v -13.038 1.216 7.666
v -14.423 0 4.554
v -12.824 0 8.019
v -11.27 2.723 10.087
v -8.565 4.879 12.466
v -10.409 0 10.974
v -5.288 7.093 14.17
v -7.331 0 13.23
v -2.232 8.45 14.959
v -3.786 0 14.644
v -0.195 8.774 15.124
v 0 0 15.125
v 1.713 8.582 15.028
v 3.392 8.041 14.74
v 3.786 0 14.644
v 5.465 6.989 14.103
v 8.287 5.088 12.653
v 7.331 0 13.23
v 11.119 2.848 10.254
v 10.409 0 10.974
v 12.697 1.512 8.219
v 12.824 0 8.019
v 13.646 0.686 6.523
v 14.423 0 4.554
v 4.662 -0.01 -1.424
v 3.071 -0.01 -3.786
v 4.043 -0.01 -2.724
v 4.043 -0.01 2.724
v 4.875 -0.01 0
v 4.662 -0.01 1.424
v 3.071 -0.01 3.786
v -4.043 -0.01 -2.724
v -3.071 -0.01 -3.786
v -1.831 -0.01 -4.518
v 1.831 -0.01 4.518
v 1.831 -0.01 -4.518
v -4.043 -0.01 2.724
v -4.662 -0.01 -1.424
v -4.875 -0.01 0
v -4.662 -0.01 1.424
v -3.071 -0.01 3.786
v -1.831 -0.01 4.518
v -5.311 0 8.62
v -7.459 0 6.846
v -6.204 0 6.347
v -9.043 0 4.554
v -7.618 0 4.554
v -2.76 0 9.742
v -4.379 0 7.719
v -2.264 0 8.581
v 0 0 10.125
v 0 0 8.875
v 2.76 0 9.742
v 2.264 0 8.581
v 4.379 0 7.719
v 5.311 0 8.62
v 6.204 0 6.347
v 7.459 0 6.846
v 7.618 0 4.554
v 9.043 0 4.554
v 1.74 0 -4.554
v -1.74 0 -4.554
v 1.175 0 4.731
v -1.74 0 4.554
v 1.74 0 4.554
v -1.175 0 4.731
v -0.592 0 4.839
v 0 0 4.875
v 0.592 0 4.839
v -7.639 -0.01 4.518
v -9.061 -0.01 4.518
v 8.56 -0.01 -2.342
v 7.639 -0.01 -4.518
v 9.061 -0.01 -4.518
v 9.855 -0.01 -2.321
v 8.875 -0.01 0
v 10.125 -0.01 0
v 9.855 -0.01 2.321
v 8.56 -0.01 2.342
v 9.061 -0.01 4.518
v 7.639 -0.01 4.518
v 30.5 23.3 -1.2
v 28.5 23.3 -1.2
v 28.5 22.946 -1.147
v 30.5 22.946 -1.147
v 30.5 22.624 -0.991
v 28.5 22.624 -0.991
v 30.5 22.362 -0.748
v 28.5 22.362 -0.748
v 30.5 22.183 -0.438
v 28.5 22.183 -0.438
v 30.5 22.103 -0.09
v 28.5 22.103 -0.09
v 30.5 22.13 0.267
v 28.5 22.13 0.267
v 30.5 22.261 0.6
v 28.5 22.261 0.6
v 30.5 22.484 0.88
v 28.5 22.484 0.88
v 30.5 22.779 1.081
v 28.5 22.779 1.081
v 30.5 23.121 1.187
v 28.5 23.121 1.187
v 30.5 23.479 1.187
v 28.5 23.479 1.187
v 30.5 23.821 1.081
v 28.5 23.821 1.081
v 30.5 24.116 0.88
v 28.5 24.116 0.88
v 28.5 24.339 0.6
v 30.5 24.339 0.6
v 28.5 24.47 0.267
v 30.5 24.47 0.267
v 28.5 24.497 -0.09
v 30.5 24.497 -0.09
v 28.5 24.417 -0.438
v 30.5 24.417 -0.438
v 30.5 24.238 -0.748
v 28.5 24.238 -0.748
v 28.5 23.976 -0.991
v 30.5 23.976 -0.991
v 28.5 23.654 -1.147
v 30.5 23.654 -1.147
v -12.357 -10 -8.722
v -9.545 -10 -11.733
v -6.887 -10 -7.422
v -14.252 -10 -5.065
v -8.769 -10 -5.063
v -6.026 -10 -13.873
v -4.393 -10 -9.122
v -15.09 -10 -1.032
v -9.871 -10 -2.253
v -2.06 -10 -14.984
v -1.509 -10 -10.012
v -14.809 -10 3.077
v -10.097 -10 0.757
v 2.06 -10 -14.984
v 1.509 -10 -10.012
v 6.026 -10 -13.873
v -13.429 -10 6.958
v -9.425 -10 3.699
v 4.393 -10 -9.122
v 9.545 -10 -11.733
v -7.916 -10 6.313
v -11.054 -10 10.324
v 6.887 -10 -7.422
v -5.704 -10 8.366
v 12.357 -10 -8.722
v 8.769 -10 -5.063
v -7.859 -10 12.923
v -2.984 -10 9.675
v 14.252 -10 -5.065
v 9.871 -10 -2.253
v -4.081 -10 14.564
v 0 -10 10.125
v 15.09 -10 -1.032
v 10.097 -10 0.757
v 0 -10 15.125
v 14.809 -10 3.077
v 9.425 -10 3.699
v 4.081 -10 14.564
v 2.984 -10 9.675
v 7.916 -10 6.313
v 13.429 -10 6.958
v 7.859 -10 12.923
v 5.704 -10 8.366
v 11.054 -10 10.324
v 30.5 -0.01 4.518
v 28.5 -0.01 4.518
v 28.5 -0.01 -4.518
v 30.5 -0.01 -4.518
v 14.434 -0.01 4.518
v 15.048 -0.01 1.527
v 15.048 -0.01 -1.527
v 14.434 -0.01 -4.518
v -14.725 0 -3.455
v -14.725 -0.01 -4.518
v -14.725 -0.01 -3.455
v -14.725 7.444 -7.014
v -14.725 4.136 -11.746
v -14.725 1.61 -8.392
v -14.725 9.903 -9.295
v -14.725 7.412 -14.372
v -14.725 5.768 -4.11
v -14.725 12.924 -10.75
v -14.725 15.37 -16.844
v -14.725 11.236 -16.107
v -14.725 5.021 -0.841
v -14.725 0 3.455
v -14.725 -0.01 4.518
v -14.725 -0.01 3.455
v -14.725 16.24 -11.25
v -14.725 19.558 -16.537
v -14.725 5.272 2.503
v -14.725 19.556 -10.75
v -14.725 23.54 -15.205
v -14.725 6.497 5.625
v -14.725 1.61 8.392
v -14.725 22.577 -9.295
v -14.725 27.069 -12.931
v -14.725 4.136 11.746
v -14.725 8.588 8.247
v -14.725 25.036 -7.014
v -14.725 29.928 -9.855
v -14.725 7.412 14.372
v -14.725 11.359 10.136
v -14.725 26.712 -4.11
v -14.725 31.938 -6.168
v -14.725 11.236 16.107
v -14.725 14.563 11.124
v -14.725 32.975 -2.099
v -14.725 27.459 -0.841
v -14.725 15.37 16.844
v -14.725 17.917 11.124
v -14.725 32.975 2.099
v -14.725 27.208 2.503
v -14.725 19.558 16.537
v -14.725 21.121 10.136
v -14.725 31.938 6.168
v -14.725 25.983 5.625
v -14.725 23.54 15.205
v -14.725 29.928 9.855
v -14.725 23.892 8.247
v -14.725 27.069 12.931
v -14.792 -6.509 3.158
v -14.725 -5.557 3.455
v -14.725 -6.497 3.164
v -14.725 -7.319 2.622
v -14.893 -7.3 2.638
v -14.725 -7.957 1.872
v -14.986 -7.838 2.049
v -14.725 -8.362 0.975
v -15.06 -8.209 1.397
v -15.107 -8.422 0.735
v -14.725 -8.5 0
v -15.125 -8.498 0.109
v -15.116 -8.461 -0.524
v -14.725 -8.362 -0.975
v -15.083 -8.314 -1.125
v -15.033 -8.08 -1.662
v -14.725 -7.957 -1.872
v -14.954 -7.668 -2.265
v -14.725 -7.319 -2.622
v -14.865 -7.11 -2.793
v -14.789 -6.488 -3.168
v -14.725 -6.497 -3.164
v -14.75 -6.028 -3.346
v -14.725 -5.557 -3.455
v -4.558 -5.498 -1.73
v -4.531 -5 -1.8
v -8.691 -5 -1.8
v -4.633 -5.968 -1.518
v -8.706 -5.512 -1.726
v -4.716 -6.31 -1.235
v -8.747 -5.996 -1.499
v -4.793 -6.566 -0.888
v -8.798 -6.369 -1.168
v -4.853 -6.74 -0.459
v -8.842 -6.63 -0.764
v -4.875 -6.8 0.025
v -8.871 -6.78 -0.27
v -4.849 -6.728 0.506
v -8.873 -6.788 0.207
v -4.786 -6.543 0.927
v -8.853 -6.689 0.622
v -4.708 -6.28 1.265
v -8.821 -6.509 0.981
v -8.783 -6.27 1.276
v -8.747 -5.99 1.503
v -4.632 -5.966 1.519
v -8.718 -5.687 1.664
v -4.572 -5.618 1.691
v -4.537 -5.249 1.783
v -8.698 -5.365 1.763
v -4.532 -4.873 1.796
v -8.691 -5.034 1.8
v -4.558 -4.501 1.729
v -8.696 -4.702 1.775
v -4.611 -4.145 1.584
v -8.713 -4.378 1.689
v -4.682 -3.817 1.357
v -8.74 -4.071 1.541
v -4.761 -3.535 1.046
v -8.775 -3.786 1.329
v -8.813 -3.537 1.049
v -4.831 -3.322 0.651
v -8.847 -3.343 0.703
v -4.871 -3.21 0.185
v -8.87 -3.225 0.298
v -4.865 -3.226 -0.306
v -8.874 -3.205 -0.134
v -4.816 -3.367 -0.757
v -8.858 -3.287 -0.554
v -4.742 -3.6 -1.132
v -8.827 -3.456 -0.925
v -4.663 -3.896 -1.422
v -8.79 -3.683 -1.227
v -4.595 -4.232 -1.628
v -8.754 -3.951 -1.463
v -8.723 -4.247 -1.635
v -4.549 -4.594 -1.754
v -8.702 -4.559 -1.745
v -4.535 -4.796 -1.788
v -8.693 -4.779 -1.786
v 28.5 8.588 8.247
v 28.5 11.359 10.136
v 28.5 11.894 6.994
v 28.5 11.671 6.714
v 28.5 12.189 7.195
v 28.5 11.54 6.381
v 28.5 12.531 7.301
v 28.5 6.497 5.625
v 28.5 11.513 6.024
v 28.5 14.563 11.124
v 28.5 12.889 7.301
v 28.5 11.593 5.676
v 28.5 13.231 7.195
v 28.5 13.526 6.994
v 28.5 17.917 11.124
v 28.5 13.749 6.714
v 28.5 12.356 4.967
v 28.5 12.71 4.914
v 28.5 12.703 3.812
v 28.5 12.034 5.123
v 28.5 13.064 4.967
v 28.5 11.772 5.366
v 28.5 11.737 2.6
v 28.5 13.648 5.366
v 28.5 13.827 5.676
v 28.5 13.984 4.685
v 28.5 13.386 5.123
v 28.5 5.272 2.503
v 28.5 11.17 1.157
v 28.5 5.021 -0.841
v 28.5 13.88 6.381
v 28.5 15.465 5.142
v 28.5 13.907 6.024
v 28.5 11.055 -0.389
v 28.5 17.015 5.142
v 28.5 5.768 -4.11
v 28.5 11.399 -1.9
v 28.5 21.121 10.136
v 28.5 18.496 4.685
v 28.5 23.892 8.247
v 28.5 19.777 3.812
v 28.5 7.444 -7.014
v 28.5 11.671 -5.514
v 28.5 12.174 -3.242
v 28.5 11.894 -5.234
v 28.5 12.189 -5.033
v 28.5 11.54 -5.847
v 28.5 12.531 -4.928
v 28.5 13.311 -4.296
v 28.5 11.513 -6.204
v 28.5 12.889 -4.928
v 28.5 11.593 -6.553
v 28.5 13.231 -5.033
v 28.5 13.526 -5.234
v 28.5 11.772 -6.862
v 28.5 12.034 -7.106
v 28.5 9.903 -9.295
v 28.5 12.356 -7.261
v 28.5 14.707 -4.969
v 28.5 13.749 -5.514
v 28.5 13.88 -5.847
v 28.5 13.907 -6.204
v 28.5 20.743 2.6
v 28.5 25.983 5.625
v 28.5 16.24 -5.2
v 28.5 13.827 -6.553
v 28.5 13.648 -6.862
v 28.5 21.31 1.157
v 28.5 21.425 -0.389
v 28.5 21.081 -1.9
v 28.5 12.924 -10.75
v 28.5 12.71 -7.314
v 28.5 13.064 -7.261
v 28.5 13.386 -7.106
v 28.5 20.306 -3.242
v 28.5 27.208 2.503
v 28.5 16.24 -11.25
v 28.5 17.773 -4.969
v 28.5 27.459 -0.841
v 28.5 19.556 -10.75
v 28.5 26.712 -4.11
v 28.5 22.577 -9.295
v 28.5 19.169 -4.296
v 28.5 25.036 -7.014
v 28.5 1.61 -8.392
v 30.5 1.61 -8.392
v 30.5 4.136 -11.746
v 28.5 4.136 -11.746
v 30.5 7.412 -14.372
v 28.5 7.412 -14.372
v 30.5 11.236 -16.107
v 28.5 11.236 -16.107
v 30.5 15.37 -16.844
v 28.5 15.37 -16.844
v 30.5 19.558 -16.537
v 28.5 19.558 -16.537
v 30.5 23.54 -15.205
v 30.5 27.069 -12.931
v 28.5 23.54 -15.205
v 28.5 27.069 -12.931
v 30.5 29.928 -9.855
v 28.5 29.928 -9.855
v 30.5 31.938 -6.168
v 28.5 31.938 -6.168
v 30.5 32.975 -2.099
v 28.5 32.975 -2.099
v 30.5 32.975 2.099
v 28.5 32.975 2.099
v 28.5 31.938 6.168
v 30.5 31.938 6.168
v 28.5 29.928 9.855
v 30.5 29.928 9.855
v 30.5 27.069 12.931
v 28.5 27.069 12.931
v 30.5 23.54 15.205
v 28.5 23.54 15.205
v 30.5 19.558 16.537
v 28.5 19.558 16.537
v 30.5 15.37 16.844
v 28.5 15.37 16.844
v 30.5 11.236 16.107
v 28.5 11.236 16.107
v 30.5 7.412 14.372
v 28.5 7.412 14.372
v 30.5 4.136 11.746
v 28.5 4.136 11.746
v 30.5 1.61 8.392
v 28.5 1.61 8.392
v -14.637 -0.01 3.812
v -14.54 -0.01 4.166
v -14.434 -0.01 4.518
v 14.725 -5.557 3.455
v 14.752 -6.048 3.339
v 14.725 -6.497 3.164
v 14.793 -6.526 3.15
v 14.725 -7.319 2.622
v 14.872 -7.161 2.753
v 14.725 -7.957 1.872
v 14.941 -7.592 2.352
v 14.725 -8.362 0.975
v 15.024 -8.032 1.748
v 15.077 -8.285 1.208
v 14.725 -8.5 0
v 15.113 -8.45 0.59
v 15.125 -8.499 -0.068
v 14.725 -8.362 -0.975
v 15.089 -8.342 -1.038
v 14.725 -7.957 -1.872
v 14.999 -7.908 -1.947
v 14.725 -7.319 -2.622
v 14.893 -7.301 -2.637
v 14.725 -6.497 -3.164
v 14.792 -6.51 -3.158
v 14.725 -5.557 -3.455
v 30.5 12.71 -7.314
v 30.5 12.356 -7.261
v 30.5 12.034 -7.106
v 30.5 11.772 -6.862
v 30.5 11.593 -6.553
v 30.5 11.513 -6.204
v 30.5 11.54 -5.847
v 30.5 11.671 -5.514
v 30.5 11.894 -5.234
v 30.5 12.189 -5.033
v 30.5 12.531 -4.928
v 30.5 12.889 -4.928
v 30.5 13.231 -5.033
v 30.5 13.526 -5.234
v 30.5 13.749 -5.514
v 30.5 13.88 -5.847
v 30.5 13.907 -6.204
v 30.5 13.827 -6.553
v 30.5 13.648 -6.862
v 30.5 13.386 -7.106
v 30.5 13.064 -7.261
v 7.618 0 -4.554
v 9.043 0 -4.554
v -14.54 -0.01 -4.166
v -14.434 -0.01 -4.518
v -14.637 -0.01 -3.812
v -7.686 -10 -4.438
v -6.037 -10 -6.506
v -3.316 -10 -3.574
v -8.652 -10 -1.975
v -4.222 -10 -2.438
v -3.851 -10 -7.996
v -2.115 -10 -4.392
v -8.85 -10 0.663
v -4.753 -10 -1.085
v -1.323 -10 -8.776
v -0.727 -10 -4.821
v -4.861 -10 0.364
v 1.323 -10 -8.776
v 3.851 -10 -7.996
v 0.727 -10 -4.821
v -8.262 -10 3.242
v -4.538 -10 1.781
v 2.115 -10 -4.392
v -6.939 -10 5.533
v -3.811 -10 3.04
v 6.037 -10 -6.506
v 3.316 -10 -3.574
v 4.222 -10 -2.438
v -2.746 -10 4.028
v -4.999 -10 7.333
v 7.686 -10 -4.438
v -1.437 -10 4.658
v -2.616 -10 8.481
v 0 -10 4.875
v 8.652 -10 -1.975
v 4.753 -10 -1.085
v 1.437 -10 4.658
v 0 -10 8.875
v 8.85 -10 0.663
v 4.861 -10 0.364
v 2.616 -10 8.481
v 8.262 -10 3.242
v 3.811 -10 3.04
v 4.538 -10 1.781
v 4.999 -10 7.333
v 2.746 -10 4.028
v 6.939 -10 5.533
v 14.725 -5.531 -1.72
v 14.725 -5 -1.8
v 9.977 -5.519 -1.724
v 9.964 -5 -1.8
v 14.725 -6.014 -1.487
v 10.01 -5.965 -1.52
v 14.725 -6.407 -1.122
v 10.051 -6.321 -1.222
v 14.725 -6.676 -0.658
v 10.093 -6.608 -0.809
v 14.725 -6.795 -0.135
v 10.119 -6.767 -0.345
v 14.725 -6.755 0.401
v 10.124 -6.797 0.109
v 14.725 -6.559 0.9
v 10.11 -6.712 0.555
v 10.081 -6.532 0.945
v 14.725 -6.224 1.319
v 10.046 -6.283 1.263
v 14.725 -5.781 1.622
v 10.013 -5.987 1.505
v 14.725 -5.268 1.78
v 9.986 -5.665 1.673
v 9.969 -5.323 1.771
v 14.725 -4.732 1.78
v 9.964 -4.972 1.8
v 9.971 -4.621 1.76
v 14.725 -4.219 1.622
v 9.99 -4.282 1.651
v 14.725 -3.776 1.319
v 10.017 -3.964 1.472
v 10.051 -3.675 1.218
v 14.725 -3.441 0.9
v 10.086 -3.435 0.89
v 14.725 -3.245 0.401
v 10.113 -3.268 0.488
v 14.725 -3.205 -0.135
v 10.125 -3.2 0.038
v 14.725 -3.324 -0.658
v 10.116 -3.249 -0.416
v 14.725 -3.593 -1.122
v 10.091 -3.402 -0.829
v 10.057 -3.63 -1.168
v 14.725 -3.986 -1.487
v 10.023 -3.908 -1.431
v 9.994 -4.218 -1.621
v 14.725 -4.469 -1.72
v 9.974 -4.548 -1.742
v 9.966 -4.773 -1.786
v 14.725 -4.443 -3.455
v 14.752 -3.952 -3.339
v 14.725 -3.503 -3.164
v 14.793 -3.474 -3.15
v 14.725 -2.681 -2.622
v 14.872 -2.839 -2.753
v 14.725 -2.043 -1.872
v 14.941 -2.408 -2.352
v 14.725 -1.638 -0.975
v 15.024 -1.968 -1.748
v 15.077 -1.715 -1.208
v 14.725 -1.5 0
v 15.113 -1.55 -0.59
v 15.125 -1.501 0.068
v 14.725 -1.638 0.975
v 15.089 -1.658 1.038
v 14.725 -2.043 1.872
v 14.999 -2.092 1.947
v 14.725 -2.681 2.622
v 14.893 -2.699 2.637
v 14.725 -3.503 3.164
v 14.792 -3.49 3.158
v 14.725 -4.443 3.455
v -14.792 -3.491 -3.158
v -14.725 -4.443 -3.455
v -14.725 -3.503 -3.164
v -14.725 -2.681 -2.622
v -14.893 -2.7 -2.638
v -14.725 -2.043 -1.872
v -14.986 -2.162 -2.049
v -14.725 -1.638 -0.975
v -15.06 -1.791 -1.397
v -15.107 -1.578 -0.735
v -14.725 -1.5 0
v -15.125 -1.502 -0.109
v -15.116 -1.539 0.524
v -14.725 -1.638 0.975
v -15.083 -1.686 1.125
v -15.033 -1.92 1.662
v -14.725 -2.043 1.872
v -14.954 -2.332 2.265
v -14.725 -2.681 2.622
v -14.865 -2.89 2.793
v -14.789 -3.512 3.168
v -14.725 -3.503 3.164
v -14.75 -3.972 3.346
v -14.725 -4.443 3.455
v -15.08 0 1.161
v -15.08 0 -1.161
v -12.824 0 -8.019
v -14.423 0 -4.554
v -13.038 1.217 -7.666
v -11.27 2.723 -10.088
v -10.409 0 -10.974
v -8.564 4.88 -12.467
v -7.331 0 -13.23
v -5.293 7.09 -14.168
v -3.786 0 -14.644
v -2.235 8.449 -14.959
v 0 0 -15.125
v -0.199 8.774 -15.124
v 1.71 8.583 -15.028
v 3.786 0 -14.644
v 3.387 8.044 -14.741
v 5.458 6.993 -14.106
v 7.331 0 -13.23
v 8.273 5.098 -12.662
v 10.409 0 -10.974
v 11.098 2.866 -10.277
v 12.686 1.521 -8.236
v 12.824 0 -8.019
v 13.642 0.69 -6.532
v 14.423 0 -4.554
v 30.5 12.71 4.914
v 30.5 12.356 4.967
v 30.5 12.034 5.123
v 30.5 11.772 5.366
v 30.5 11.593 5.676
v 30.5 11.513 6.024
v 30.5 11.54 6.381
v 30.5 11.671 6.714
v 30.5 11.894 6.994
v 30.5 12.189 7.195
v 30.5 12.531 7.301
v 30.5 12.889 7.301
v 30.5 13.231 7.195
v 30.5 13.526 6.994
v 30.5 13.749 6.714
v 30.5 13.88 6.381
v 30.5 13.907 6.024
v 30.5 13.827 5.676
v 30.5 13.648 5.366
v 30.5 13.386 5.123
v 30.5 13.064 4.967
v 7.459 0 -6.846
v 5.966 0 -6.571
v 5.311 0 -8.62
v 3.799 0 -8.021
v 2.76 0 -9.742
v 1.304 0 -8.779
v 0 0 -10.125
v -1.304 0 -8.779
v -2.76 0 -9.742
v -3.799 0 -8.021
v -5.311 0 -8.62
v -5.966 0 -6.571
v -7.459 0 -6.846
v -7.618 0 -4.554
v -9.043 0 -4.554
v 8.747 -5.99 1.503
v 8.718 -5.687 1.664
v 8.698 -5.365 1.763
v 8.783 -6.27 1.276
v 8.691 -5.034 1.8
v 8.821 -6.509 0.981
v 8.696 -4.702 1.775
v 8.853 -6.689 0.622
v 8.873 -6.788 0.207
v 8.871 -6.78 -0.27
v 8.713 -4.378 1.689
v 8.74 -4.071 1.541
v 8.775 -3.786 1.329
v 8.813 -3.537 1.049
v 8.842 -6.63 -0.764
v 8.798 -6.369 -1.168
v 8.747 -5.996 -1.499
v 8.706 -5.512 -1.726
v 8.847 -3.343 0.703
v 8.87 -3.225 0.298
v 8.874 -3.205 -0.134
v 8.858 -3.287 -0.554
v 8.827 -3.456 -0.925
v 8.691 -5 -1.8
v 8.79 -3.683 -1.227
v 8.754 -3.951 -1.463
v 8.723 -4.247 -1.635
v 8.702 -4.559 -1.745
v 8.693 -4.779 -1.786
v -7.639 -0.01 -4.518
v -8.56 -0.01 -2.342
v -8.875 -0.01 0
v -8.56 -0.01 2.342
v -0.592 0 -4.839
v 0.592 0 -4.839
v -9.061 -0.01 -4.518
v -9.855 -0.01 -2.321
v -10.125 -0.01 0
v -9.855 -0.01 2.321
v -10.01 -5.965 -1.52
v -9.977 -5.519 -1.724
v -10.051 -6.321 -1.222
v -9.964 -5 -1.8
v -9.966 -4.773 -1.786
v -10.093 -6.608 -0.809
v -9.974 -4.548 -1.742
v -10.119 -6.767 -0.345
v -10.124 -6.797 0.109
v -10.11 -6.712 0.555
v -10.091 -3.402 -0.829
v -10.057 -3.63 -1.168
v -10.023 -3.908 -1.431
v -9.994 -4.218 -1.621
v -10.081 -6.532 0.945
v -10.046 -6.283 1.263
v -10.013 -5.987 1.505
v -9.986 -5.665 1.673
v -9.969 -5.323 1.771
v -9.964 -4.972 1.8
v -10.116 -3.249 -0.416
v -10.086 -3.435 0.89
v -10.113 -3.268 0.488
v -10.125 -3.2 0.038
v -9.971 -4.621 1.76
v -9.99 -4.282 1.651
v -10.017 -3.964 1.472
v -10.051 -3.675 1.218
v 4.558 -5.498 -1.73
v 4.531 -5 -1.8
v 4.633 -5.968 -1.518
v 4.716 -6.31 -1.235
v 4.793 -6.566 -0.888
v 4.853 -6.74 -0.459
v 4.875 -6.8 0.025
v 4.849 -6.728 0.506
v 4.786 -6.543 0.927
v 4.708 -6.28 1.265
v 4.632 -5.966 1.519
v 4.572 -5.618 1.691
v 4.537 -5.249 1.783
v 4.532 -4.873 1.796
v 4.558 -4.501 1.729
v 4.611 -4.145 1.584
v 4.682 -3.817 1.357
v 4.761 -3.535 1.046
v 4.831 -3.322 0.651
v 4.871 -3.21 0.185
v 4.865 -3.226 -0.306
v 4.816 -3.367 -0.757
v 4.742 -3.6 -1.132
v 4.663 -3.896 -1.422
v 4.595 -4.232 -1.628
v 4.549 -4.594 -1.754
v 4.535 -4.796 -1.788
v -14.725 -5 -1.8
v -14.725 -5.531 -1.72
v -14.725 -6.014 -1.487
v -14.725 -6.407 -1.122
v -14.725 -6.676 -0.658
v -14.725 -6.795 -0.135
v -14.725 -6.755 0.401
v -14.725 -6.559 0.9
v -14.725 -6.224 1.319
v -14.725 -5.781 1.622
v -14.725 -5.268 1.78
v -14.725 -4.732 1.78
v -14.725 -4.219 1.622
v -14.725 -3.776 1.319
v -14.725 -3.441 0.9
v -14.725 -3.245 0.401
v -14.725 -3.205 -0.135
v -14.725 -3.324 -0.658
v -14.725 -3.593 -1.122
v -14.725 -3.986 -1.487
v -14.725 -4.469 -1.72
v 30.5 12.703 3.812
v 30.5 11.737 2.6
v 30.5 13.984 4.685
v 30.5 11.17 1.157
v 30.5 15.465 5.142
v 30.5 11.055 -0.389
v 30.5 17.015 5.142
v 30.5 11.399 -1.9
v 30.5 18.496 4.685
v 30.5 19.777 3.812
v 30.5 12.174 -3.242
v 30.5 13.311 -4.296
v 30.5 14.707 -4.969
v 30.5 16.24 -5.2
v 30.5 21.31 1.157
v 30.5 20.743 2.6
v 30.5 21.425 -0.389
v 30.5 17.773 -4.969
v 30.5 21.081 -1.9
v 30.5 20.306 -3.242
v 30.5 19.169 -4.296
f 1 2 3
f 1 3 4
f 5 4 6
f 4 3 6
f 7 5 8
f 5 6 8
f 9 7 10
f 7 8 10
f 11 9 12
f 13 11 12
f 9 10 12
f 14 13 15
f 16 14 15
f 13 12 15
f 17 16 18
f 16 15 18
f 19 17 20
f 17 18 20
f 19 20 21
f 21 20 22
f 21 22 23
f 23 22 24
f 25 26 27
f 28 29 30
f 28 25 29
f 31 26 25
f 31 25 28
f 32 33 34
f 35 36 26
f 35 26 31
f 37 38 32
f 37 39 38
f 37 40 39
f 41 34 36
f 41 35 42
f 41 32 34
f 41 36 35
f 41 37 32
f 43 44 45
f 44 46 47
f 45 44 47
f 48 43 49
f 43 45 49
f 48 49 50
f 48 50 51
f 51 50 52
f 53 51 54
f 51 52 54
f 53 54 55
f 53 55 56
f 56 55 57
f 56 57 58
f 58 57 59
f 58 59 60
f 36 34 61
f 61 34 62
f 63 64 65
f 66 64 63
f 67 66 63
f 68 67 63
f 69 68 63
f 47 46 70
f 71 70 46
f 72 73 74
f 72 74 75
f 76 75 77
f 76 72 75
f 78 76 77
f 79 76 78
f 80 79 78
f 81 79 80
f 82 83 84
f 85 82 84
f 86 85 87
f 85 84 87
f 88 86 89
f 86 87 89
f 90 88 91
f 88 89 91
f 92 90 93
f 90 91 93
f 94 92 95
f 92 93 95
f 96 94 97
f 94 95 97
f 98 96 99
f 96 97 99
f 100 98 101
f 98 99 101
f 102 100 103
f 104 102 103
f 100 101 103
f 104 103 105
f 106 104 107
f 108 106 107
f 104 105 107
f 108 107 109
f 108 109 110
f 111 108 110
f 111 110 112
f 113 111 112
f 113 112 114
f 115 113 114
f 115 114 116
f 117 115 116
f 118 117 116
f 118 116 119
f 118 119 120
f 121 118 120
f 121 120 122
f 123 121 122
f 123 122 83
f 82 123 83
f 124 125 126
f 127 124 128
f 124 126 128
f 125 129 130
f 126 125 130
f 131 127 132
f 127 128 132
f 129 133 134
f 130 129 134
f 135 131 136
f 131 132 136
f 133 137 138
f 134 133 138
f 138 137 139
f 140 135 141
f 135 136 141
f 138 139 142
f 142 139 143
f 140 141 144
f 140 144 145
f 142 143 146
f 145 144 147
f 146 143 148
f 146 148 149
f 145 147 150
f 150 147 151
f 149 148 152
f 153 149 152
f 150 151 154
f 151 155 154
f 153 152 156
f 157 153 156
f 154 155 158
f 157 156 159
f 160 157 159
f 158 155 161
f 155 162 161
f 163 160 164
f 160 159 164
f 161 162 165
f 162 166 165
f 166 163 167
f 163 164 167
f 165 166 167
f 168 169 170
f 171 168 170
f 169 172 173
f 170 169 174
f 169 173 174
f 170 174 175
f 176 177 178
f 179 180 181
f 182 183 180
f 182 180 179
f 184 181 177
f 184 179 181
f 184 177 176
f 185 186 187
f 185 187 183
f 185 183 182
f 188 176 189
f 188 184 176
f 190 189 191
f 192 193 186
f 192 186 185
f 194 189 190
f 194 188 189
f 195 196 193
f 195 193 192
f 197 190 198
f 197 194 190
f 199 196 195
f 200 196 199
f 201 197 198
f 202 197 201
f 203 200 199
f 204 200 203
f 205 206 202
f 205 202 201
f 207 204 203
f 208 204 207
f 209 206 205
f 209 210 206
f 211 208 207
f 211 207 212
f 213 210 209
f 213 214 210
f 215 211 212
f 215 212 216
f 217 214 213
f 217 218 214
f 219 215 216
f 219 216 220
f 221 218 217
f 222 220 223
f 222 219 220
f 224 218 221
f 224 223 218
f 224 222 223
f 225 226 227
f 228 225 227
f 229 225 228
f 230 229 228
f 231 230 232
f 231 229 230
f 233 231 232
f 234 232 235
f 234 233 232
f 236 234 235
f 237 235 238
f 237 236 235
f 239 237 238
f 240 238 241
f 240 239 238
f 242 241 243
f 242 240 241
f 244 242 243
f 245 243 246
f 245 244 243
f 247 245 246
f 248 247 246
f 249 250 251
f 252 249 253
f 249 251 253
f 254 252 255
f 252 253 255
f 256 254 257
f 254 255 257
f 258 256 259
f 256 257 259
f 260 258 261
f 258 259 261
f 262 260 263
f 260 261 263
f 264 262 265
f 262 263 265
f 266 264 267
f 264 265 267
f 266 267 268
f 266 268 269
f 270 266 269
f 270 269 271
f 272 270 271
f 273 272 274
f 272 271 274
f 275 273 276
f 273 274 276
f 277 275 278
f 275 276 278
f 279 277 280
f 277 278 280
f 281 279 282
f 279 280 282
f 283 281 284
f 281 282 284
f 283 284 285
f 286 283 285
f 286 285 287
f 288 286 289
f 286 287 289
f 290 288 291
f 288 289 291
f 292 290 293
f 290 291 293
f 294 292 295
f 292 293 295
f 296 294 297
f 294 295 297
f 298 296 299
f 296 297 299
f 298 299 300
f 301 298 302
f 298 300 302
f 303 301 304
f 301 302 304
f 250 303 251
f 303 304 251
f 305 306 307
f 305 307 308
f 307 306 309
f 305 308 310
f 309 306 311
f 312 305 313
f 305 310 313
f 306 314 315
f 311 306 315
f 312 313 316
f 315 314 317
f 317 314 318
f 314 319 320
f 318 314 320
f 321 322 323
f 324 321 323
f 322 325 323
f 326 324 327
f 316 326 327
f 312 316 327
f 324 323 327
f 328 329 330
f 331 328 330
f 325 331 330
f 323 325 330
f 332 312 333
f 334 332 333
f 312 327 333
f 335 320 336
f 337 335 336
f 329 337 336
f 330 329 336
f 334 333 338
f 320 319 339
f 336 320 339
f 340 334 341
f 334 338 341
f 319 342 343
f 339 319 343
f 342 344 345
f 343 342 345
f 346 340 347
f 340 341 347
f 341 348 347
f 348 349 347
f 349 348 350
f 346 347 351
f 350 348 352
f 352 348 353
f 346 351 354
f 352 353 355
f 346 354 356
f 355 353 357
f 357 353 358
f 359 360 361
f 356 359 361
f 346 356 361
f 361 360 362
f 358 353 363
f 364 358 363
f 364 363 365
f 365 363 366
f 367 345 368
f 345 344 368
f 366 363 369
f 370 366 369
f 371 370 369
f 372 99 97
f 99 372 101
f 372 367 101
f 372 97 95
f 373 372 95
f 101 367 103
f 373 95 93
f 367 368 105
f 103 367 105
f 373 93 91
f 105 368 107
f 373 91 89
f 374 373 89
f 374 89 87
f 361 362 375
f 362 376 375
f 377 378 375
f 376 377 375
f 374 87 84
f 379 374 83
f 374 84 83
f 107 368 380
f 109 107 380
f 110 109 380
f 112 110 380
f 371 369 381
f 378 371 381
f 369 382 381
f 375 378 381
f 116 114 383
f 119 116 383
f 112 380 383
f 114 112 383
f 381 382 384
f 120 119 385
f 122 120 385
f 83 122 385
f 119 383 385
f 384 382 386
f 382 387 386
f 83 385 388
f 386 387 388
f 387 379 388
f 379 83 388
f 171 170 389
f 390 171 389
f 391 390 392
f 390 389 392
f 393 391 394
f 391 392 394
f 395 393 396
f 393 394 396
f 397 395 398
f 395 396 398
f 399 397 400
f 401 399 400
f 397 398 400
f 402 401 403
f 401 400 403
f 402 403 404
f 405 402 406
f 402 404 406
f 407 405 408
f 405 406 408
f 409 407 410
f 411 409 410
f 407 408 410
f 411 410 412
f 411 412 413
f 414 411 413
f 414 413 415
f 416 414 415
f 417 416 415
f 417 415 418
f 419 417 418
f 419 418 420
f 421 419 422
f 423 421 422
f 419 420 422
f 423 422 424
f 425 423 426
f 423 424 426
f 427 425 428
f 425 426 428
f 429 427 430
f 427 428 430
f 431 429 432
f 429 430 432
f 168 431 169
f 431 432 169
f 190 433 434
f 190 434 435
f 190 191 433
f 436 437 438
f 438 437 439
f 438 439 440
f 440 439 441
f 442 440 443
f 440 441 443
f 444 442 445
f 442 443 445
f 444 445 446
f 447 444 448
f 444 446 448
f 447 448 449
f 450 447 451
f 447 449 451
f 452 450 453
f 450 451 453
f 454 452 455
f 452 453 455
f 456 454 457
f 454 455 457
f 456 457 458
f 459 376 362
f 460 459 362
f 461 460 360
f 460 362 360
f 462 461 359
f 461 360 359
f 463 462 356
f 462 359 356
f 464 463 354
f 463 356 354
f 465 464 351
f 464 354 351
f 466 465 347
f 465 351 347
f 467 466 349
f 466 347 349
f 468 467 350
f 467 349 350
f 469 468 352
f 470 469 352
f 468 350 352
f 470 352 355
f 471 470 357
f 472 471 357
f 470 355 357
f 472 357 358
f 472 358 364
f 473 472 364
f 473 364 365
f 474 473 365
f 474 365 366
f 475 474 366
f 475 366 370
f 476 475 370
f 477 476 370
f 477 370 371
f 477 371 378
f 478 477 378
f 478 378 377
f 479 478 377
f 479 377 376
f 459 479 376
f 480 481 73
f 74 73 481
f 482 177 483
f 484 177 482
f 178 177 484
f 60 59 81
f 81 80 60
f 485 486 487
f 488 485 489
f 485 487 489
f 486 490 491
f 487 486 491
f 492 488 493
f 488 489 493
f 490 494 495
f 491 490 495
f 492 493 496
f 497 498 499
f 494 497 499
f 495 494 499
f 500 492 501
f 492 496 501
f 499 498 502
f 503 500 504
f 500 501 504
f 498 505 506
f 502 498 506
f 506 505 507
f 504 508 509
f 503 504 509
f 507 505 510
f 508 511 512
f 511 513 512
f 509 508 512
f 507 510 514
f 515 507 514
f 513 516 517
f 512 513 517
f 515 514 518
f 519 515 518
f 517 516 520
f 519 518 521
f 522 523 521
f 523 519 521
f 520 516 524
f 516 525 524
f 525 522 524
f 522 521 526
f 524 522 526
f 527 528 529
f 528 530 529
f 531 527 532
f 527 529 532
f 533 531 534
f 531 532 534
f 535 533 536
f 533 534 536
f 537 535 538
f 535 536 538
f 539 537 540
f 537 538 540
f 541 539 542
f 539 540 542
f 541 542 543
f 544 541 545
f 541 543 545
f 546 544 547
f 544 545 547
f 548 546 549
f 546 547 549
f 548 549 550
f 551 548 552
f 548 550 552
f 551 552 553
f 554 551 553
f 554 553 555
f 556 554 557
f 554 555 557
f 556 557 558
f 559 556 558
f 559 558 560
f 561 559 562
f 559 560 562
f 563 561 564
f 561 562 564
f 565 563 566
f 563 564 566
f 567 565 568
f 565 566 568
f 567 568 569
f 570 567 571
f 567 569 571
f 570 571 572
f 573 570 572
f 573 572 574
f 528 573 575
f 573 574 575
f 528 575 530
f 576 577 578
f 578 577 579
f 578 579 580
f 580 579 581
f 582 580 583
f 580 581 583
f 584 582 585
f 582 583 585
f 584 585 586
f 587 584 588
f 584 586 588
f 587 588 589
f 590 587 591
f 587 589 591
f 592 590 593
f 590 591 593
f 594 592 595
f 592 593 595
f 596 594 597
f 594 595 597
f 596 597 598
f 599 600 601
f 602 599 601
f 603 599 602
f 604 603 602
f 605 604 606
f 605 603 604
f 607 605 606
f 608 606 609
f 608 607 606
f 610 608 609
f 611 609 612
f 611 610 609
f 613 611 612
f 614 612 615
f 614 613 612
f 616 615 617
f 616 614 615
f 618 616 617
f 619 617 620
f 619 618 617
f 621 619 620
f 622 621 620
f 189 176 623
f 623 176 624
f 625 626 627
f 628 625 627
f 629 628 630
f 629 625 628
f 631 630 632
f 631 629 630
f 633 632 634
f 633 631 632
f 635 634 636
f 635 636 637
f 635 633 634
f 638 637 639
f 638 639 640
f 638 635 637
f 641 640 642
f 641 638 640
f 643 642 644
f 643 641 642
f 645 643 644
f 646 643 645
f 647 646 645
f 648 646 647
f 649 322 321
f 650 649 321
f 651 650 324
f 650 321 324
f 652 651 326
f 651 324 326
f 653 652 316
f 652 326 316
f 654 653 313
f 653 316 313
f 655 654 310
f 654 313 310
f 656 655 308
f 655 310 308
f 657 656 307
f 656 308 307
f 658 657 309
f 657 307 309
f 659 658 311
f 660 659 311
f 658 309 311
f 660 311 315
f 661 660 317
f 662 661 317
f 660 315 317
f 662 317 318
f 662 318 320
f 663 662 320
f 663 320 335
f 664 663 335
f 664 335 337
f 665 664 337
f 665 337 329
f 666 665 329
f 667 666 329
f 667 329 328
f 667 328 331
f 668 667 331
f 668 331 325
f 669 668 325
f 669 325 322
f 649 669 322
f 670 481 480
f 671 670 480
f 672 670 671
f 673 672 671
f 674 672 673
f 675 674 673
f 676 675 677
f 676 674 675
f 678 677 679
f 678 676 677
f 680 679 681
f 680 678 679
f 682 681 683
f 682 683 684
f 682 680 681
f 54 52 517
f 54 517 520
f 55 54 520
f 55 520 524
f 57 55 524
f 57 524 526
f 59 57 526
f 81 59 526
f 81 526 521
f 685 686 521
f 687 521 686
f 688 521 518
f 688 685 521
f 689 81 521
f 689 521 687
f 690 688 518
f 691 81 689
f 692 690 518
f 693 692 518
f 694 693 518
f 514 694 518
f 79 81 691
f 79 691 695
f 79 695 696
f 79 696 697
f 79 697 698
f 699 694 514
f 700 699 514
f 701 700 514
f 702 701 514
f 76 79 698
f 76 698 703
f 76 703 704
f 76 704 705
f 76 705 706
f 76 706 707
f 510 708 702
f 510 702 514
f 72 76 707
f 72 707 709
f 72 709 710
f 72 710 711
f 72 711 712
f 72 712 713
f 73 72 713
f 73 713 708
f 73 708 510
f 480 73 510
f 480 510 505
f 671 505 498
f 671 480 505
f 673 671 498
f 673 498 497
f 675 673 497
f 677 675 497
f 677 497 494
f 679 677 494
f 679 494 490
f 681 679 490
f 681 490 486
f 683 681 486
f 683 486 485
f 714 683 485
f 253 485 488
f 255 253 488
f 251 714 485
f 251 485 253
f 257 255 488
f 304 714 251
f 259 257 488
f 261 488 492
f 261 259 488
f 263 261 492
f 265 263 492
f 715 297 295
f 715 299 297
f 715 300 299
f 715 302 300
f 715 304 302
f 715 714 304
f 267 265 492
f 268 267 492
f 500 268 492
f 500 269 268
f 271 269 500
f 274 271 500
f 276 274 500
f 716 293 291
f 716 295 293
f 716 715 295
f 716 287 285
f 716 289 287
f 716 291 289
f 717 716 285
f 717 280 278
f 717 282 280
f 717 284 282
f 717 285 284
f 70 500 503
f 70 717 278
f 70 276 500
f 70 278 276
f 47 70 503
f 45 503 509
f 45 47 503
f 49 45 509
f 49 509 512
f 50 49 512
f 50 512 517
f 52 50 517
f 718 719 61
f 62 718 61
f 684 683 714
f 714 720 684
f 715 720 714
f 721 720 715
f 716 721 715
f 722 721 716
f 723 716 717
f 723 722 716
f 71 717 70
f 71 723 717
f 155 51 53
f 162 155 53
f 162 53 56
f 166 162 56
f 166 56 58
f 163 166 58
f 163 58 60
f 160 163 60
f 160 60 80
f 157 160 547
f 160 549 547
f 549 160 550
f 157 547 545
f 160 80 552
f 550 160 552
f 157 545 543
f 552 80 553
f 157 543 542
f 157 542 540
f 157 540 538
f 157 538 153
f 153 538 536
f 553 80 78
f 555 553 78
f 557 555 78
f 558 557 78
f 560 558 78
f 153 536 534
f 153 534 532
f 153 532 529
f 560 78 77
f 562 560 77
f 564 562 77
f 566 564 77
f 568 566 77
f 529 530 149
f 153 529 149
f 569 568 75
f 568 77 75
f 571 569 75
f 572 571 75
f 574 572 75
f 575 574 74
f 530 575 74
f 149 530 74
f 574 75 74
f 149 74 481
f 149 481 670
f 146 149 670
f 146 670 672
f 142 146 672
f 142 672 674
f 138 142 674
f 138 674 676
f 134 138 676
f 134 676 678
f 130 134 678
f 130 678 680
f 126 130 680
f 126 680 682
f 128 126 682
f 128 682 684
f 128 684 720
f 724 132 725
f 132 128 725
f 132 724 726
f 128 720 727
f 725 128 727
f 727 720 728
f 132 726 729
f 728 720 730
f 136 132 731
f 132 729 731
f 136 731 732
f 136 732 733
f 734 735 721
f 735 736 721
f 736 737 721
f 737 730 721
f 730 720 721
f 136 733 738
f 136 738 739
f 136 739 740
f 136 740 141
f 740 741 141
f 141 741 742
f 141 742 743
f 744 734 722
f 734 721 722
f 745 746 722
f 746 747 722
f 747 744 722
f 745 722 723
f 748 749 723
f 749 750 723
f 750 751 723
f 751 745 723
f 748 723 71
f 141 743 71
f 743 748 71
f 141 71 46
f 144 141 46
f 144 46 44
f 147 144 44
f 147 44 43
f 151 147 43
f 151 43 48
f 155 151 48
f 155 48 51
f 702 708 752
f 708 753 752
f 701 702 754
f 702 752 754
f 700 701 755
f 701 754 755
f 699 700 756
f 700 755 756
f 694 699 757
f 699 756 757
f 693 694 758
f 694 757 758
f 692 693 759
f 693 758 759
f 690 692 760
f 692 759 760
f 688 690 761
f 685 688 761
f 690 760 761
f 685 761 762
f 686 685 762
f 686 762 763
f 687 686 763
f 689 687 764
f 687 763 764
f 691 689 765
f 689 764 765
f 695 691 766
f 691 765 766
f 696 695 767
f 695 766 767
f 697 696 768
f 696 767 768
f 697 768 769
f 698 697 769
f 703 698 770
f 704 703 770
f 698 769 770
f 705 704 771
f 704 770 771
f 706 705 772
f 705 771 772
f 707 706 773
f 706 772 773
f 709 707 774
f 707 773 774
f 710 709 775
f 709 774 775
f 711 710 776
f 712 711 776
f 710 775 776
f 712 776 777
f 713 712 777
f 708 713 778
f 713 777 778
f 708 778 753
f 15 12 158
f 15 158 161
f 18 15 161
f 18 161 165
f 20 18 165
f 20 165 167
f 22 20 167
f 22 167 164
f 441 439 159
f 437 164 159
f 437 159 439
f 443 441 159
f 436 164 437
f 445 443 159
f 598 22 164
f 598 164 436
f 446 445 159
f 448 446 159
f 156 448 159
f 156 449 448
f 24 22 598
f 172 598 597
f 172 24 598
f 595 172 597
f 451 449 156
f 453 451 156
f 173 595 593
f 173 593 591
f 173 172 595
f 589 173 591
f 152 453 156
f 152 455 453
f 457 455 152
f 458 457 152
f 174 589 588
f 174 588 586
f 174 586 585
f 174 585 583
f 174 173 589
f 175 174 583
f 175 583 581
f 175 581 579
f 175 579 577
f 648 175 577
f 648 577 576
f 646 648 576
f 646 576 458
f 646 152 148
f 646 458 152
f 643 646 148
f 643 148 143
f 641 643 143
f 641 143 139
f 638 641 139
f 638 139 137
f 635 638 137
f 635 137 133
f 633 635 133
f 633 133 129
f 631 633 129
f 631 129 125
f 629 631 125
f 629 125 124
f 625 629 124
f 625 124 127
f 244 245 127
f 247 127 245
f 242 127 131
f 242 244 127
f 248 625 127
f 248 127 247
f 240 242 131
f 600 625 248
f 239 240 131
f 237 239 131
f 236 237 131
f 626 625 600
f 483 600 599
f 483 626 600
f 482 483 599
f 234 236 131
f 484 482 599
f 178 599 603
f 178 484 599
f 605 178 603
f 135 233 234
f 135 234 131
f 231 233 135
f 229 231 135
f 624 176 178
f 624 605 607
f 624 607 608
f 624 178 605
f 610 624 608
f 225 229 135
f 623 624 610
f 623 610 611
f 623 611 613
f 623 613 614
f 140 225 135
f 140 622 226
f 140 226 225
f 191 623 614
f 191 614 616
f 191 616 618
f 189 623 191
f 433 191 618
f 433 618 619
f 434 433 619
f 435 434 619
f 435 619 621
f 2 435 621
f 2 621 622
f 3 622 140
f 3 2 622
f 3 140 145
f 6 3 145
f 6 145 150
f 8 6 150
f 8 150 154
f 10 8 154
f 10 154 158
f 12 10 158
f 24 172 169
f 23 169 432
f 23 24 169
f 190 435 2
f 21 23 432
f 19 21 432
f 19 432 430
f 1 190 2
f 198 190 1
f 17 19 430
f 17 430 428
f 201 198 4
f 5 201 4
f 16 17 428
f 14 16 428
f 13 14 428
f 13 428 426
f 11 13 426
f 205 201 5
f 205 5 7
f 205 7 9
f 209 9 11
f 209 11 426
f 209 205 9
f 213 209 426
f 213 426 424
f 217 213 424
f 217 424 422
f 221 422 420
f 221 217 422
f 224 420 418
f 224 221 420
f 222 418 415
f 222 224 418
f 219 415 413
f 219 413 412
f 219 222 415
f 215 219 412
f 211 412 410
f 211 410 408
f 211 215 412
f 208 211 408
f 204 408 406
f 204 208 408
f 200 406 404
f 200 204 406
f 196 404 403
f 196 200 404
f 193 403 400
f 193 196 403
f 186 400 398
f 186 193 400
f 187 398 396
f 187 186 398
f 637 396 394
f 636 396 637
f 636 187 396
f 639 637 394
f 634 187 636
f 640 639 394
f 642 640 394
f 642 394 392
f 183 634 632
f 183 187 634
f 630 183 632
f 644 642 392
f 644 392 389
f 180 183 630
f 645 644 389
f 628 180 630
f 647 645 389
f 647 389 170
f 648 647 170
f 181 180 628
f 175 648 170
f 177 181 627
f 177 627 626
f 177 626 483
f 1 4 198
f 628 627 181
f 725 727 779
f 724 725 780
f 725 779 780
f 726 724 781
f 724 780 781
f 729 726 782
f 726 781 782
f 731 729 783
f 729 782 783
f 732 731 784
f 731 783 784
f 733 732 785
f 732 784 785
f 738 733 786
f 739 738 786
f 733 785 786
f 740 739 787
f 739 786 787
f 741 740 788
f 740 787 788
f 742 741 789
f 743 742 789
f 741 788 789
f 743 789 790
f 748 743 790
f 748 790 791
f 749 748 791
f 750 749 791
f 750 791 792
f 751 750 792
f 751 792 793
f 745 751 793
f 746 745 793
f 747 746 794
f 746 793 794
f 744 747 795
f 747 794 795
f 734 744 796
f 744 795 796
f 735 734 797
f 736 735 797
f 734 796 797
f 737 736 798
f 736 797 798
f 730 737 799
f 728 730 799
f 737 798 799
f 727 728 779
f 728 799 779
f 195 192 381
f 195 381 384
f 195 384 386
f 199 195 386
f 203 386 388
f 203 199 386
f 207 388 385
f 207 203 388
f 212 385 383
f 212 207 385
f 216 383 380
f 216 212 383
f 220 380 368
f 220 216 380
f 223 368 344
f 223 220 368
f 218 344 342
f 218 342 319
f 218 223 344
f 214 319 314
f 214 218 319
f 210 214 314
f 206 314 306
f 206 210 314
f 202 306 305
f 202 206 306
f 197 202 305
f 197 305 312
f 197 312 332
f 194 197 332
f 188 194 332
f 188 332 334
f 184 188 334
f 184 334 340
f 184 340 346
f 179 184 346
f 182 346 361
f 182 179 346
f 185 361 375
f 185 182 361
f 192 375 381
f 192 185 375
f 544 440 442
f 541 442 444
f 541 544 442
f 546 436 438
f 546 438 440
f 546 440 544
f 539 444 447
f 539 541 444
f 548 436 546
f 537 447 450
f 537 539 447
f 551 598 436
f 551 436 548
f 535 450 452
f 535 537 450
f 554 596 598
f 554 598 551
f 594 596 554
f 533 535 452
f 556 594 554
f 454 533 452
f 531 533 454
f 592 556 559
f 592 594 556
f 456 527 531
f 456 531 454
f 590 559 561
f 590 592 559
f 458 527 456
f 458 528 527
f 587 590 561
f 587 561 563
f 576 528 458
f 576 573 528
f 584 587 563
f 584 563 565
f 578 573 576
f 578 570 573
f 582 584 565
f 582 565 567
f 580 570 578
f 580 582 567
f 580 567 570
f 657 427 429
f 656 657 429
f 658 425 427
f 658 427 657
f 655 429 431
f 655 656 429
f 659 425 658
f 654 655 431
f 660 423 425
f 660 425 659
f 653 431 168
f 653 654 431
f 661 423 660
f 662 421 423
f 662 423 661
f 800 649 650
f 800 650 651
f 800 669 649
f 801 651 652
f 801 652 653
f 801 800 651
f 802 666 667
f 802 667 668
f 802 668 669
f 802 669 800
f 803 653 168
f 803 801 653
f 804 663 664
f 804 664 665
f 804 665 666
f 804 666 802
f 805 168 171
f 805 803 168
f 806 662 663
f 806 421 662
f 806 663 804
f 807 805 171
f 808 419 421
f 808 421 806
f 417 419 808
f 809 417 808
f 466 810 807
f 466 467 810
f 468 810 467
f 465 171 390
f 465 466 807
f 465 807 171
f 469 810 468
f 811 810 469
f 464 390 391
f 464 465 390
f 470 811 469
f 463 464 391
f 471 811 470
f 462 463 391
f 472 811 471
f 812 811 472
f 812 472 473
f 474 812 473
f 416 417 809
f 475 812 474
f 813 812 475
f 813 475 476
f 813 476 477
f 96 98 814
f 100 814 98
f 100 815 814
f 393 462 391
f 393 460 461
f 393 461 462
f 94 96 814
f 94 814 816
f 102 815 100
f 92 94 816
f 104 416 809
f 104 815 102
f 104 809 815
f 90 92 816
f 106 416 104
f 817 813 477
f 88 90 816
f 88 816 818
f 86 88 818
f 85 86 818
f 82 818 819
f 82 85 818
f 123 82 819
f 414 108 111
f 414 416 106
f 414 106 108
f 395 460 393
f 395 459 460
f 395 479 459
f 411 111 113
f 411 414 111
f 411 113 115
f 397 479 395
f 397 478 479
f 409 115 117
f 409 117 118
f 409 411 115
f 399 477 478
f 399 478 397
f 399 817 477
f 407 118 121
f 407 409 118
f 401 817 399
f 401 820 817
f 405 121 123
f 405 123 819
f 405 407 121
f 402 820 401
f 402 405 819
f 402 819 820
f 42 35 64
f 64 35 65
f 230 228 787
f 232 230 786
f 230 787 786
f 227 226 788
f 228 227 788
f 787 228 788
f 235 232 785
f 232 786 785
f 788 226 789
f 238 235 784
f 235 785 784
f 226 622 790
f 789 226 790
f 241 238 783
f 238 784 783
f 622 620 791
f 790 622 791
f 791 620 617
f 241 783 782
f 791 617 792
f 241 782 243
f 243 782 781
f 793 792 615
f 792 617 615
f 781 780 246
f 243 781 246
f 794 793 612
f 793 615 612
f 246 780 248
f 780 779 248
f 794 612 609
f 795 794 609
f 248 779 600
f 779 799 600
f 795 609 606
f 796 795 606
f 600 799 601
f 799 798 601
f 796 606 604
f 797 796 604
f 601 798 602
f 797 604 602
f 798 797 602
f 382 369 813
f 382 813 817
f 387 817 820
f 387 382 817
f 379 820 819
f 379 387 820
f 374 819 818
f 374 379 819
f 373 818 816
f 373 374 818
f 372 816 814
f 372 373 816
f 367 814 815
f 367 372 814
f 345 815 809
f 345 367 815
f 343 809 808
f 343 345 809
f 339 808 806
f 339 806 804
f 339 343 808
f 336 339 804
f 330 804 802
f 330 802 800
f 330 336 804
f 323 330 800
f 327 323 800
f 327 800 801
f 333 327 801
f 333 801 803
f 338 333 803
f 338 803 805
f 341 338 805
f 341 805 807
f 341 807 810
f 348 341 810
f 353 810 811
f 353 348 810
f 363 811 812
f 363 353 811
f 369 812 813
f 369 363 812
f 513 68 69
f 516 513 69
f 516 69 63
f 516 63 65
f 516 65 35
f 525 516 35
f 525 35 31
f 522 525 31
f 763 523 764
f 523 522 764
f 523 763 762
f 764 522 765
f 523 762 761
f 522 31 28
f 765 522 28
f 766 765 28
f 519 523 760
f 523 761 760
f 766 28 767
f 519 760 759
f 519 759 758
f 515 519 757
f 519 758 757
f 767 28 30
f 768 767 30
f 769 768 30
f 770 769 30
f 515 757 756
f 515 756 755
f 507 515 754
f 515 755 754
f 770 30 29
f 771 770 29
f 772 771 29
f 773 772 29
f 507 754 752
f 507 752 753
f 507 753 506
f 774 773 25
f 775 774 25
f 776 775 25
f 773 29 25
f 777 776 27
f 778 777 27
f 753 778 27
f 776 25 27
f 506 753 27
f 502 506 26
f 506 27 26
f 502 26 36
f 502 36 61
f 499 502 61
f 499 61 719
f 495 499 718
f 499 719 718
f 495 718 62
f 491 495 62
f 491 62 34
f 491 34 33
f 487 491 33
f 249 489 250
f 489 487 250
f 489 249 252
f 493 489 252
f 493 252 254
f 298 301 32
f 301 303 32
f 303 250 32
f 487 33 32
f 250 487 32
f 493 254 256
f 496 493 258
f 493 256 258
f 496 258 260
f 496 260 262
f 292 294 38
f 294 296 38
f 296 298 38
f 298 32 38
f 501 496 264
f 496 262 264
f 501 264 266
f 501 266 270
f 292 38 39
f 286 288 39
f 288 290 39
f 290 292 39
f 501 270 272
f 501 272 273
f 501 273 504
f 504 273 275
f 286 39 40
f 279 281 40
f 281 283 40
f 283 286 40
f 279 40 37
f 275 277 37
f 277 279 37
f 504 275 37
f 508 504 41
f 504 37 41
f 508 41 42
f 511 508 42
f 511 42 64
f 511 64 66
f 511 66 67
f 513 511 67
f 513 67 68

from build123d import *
from build123d.topology import SkipClean

# Parameters (mm, degrees)
SKETCH1_R             = 15.125
SKETCH1_R_2           = 10.125
BOSS_EXTRUDE1_DEPTH   = 10
SKETCH1_R_3           = 8.875
SKETCH1_R_4           = 4.875
BOSS_EXTRUDE1_2_DEPTH = 10
SKETCH28_W            = 1.8
SKETCH28_H            = 30.25
SKETCH30_R            = 3.5
CUT_EXTRUDE4_DEPTH    = 0.4
BOSS_EXTRUDE3_START   = -43.225
SKETCH3_R             = 11.25
BOSS_EXTRUDE3_DEPTH   = 43.225
BOSS_EXTRUDE2_REACH   = 48.827
SKETCH31_R            = 5.2
BOSS_EXTRUDE4_DEPTH   = 2
M2_CLEARANCE_HOLE1_D  = 2.4


with BuildPart() as part:
    # Sketch1 → Boss-Extrude1 (new body)
    with BuildSketch(Plane(origin=(0, 0, 0), x_dir=(1, 0, 0), z_dir=(0, 1, 0))):
        with Locations(Location((0, 0, 0), (0, 0, 270))):
            Circle(SKETCH1_R)
        with Locations(Location((0, 0, 0), (0, 0, 270))):
            Circle(SKETCH1_R_2, mode=Mode.SUBTRACT)
    extrude(amount=-BOSS_EXTRUDE1_DEPTH)


with BuildPart() as body_2:
    # Sketch1 → Boss-Extrude1 2 (new body)
    with BuildSketch(Plane(origin=(0, 0, 0), x_dir=(1, 0, 0), z_dir=(0, 1, 0))):
        with Locations(Location((0, 0, 0), (0, 0, 270))):
            Circle(SKETCH1_R_3)
        with Locations(Location((0, 0, 0), (0, 0, 270))):
            Circle(SKETCH1_R_4, mode=Mode.SUBTRACT)
    extrude(amount=-BOSS_EXTRUDE1_2_DEPTH)


with BuildPart() as m3_clearance_hole1_tool:
    # Sketch28 → M3 Clearance Hole1 (revolve)
    with BuildSketch(Plane(origin=(15.125, -5, 0), x_dir=(0, 0, -1), z_dir=(0, 1, 0))):
        with Locations((0.9, 15.125)):
            Rectangle(SKETCH28_W, SKETCH28_H)
    revolve(axis=Axis((21.475, -5, 0), (-1, 0, 0)))


with BuildPart() as part_1:
    add(part.part)

    # M3 Clearance Hole1: cut by m3_clearance_hole1_tool
    add(m3_clearance_hole1_tool.part, mode=Mode.SUBTRACT)

    # Sketch30 → Cut-Extrude4 (cut)
    with BuildSketch(Plane(origin=(15.125, 0, 0), x_dir=(0, 0, -1), z_dir=(1, 0, 0))):
        with Locations((0, -5)):
            Circle(SKETCH30_R)
    cut_extrude4 = extrude(amount=-CUT_EXTRUDE4_DEPTH, mode=Mode.SUBTRACT)

    # Mirror1: Cut-Extrude4 across plane
    add(cut_extrude4.mirror(Plane(origin=(0, 0, 0), x_dir=(0, 0, 1), z_dir=(1, 0, 0))), mode=Mode.SUBTRACT)



with BuildPart() as body_2_1:
    add(body_2.part)

    # M3 Clearance Hole1: cut by m3_clearance_hole1_tool
    add(m3_clearance_hole1_tool.part, mode=Mode.SUBTRACT)


with BuildPart() as part_2:
    add(part_1.part)

    add(body_2_1.part)  # Boss-Extrude3 merges body 2
    # Sketch3 → Boss-Extrude3 (add)
    with BuildSketch(Plane(origin=(28.5, 0, 0), x_dir=(0, 0, -1), z_dir=(1, 0, 0)).offset(BOSS_EXTRUDE3_START)):
        with BuildLine():
            Line((4.51796247, -0.01), (-4.51796247, -0.01))
            ThreePointArc((-4.51796247, -0.01), (0, 33.10637142), (4.51796247, -0.01))
        make_face()
        with Locations((0, 16.24)):
            Circle(SKETCH3_R, mode=Mode.SUBTRACT)
    extrude(amount=BOSS_EXTRUDE3_DEPTH)

    # Sketch2 → Boss-Extrude2 (add, up to next)
    with BuildSketch(Plane(origin=(0, 0, 0), x_dir=(1, 0, 0), z_dir=(0, 1, 0)), mode=Mode.PRIVATE) as boss_extrude2_sk1:
        with BuildLine():
            Line((14.423201452, -4.553776991), (-14.423201452, -4.553776991))
            ThreePointArc((-14.423201452, -4.553776991), (0, -15.125), (14.423201452, -4.553776991))
        make_face()
    boss_extrude2_tool1 = extrude(boss_extrude2_sk1.sketch, amount=BOSS_EXTRUDE2_REACH, mode=Mode.PRIVATE) - part_2.part
    # Sketch2 → Boss-Extrude2 (add, up to next)
    with BuildSketch(Plane(origin=(0, 0, 0), x_dir=(1, 0, 0), z_dir=(0, 1, 0)), mode=Mode.PRIVATE) as boss_extrude2_sk2:
        with BuildLine():
            Line((14.423201452, 4.553776991), (-14.423201452, 4.553776991))
            ThreePointArc((-14.423201452, 4.553776991), (0, 15.125), (14.423201452, 4.553776991))
        make_face()
    boss_extrude2_tool2 = extrude(boss_extrude2_sk2.sketch, amount=BOSS_EXTRUDE2_REACH, mode=Mode.PRIVATE) - part_2.part
    add(boss_extrude2_tool1.solids().sort_by_distance((0, 0, 8.941745))[0])
    add(boss_extrude2_tool2.solids().sort_by_distance((0, 0, -8.941745))[0])

    # Sketch31 → Boss-Extrude4 (add)
    with SkipClean():  # the faces are left unmerged after this step: merging them gives an invalid solid
        with BuildSketch(Plane(origin=(28.5, 0, 0), x_dir=(0, 0, -1), z_dir=(1, 0, 0))):
            with BuildLine():
                Line((-4.51796247, -0.01), (4.51796247, -0.01))
                ThreePointArc((4.51796247, -0.01), (0, 33.10637142), (-4.51796247, -0.01))
            make_face()
            with Locations((0, 16.24)):
                Circle(SKETCH31_R, mode=Mode.SUBTRACT)
        extrude(amount=BOSS_EXTRUDE4_DEPTH)

    # M2 Clearance Hole1 (through all)
    with Locations(Plane(origin=(30.5, 0, 0), x_dir=(0, 0, 1), z_dir=(1, 0, 0))):
        with Locations((0, -23.3), (6.114139351, -12.71), (-6.114139351, -12.71), (0, -16.24)):
            Hole(M2_CLEARANCE_HOLE1_D / 2)


solid = part_2.part
